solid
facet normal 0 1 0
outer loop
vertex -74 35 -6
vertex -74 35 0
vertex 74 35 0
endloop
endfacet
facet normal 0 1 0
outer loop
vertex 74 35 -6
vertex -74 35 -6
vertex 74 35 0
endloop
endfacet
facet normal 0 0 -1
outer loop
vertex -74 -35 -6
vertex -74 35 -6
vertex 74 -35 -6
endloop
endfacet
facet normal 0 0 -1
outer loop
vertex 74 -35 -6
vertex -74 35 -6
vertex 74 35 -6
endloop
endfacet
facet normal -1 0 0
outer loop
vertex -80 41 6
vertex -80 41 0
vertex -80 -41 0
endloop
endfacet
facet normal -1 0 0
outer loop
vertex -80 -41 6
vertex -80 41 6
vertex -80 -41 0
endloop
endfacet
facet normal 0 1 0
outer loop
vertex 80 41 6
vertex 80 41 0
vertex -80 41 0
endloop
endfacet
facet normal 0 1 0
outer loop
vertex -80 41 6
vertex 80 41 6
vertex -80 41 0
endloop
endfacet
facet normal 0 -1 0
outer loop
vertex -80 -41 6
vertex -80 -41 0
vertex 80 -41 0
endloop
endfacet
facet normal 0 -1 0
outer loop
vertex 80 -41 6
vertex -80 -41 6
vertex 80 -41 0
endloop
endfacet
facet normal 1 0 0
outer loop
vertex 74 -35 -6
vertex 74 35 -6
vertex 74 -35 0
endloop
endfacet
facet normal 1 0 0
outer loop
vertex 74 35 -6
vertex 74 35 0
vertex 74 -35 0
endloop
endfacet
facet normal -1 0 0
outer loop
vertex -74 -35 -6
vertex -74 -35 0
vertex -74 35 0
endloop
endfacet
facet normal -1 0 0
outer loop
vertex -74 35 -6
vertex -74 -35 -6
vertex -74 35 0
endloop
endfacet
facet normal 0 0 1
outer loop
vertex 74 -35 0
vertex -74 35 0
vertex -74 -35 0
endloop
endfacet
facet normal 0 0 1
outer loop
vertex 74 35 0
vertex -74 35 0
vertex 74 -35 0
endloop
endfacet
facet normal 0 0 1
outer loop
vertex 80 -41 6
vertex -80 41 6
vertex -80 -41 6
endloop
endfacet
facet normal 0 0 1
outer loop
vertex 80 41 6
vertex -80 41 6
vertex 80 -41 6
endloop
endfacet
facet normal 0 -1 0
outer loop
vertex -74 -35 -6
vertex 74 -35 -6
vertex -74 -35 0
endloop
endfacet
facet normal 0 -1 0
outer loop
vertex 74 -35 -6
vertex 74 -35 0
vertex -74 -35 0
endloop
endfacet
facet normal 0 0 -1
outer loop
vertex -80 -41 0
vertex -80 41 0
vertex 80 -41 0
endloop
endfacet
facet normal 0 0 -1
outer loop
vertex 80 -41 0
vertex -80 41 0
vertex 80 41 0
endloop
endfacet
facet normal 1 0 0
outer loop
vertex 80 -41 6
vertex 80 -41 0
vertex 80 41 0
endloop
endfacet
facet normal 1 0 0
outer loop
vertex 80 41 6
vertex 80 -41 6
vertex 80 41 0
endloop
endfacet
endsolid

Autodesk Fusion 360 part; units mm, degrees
sketch "Sketch1" plane through (0, 0, 0) normal (0, 0, 1) x (1, 0, 0)
  line L0 (74, -35) -> (-74, -35)
  line L1 (-74, -35) -> (-74, 35)
  line L2 (-74, 35) -> (74, 35)
  line L3 (74, 35) -> (74, -35)
  line L4 (74, -35) -> (-74, 35) construction
  line L5 (-74, -35) -> (74, 35) construction
  line L6 (80, 41) -> (-80, 41)
  line L7 (-80, 41) -> (-80, -41)
  line L8 (-80, -41) -> (80, -41)
  line L9 (80, -41) -> (80, 41)
  line L10 (80, 41) -> (-80, -41) construction
  line L11 (-80, 41) -> (80, -41) construction
  dimension "d1" = 148
  dimension "d2" = 70
  dimension "d3" = 160
  dimension "d4" = 82
extrude "Extrude1" add sketch "Sketch1" against normal blind 6 contours L0 L1 L2 L3 makes body 1
extrude "Extrude2" add sketch "Sketch1" along normal blind 6 separate body contours L0 L1 L2 L3 | L6 L7 L8 L9 makes body 2
equation "d3 = d1 + 12 mm"
equation "d4 = d2 + 12 mm"
